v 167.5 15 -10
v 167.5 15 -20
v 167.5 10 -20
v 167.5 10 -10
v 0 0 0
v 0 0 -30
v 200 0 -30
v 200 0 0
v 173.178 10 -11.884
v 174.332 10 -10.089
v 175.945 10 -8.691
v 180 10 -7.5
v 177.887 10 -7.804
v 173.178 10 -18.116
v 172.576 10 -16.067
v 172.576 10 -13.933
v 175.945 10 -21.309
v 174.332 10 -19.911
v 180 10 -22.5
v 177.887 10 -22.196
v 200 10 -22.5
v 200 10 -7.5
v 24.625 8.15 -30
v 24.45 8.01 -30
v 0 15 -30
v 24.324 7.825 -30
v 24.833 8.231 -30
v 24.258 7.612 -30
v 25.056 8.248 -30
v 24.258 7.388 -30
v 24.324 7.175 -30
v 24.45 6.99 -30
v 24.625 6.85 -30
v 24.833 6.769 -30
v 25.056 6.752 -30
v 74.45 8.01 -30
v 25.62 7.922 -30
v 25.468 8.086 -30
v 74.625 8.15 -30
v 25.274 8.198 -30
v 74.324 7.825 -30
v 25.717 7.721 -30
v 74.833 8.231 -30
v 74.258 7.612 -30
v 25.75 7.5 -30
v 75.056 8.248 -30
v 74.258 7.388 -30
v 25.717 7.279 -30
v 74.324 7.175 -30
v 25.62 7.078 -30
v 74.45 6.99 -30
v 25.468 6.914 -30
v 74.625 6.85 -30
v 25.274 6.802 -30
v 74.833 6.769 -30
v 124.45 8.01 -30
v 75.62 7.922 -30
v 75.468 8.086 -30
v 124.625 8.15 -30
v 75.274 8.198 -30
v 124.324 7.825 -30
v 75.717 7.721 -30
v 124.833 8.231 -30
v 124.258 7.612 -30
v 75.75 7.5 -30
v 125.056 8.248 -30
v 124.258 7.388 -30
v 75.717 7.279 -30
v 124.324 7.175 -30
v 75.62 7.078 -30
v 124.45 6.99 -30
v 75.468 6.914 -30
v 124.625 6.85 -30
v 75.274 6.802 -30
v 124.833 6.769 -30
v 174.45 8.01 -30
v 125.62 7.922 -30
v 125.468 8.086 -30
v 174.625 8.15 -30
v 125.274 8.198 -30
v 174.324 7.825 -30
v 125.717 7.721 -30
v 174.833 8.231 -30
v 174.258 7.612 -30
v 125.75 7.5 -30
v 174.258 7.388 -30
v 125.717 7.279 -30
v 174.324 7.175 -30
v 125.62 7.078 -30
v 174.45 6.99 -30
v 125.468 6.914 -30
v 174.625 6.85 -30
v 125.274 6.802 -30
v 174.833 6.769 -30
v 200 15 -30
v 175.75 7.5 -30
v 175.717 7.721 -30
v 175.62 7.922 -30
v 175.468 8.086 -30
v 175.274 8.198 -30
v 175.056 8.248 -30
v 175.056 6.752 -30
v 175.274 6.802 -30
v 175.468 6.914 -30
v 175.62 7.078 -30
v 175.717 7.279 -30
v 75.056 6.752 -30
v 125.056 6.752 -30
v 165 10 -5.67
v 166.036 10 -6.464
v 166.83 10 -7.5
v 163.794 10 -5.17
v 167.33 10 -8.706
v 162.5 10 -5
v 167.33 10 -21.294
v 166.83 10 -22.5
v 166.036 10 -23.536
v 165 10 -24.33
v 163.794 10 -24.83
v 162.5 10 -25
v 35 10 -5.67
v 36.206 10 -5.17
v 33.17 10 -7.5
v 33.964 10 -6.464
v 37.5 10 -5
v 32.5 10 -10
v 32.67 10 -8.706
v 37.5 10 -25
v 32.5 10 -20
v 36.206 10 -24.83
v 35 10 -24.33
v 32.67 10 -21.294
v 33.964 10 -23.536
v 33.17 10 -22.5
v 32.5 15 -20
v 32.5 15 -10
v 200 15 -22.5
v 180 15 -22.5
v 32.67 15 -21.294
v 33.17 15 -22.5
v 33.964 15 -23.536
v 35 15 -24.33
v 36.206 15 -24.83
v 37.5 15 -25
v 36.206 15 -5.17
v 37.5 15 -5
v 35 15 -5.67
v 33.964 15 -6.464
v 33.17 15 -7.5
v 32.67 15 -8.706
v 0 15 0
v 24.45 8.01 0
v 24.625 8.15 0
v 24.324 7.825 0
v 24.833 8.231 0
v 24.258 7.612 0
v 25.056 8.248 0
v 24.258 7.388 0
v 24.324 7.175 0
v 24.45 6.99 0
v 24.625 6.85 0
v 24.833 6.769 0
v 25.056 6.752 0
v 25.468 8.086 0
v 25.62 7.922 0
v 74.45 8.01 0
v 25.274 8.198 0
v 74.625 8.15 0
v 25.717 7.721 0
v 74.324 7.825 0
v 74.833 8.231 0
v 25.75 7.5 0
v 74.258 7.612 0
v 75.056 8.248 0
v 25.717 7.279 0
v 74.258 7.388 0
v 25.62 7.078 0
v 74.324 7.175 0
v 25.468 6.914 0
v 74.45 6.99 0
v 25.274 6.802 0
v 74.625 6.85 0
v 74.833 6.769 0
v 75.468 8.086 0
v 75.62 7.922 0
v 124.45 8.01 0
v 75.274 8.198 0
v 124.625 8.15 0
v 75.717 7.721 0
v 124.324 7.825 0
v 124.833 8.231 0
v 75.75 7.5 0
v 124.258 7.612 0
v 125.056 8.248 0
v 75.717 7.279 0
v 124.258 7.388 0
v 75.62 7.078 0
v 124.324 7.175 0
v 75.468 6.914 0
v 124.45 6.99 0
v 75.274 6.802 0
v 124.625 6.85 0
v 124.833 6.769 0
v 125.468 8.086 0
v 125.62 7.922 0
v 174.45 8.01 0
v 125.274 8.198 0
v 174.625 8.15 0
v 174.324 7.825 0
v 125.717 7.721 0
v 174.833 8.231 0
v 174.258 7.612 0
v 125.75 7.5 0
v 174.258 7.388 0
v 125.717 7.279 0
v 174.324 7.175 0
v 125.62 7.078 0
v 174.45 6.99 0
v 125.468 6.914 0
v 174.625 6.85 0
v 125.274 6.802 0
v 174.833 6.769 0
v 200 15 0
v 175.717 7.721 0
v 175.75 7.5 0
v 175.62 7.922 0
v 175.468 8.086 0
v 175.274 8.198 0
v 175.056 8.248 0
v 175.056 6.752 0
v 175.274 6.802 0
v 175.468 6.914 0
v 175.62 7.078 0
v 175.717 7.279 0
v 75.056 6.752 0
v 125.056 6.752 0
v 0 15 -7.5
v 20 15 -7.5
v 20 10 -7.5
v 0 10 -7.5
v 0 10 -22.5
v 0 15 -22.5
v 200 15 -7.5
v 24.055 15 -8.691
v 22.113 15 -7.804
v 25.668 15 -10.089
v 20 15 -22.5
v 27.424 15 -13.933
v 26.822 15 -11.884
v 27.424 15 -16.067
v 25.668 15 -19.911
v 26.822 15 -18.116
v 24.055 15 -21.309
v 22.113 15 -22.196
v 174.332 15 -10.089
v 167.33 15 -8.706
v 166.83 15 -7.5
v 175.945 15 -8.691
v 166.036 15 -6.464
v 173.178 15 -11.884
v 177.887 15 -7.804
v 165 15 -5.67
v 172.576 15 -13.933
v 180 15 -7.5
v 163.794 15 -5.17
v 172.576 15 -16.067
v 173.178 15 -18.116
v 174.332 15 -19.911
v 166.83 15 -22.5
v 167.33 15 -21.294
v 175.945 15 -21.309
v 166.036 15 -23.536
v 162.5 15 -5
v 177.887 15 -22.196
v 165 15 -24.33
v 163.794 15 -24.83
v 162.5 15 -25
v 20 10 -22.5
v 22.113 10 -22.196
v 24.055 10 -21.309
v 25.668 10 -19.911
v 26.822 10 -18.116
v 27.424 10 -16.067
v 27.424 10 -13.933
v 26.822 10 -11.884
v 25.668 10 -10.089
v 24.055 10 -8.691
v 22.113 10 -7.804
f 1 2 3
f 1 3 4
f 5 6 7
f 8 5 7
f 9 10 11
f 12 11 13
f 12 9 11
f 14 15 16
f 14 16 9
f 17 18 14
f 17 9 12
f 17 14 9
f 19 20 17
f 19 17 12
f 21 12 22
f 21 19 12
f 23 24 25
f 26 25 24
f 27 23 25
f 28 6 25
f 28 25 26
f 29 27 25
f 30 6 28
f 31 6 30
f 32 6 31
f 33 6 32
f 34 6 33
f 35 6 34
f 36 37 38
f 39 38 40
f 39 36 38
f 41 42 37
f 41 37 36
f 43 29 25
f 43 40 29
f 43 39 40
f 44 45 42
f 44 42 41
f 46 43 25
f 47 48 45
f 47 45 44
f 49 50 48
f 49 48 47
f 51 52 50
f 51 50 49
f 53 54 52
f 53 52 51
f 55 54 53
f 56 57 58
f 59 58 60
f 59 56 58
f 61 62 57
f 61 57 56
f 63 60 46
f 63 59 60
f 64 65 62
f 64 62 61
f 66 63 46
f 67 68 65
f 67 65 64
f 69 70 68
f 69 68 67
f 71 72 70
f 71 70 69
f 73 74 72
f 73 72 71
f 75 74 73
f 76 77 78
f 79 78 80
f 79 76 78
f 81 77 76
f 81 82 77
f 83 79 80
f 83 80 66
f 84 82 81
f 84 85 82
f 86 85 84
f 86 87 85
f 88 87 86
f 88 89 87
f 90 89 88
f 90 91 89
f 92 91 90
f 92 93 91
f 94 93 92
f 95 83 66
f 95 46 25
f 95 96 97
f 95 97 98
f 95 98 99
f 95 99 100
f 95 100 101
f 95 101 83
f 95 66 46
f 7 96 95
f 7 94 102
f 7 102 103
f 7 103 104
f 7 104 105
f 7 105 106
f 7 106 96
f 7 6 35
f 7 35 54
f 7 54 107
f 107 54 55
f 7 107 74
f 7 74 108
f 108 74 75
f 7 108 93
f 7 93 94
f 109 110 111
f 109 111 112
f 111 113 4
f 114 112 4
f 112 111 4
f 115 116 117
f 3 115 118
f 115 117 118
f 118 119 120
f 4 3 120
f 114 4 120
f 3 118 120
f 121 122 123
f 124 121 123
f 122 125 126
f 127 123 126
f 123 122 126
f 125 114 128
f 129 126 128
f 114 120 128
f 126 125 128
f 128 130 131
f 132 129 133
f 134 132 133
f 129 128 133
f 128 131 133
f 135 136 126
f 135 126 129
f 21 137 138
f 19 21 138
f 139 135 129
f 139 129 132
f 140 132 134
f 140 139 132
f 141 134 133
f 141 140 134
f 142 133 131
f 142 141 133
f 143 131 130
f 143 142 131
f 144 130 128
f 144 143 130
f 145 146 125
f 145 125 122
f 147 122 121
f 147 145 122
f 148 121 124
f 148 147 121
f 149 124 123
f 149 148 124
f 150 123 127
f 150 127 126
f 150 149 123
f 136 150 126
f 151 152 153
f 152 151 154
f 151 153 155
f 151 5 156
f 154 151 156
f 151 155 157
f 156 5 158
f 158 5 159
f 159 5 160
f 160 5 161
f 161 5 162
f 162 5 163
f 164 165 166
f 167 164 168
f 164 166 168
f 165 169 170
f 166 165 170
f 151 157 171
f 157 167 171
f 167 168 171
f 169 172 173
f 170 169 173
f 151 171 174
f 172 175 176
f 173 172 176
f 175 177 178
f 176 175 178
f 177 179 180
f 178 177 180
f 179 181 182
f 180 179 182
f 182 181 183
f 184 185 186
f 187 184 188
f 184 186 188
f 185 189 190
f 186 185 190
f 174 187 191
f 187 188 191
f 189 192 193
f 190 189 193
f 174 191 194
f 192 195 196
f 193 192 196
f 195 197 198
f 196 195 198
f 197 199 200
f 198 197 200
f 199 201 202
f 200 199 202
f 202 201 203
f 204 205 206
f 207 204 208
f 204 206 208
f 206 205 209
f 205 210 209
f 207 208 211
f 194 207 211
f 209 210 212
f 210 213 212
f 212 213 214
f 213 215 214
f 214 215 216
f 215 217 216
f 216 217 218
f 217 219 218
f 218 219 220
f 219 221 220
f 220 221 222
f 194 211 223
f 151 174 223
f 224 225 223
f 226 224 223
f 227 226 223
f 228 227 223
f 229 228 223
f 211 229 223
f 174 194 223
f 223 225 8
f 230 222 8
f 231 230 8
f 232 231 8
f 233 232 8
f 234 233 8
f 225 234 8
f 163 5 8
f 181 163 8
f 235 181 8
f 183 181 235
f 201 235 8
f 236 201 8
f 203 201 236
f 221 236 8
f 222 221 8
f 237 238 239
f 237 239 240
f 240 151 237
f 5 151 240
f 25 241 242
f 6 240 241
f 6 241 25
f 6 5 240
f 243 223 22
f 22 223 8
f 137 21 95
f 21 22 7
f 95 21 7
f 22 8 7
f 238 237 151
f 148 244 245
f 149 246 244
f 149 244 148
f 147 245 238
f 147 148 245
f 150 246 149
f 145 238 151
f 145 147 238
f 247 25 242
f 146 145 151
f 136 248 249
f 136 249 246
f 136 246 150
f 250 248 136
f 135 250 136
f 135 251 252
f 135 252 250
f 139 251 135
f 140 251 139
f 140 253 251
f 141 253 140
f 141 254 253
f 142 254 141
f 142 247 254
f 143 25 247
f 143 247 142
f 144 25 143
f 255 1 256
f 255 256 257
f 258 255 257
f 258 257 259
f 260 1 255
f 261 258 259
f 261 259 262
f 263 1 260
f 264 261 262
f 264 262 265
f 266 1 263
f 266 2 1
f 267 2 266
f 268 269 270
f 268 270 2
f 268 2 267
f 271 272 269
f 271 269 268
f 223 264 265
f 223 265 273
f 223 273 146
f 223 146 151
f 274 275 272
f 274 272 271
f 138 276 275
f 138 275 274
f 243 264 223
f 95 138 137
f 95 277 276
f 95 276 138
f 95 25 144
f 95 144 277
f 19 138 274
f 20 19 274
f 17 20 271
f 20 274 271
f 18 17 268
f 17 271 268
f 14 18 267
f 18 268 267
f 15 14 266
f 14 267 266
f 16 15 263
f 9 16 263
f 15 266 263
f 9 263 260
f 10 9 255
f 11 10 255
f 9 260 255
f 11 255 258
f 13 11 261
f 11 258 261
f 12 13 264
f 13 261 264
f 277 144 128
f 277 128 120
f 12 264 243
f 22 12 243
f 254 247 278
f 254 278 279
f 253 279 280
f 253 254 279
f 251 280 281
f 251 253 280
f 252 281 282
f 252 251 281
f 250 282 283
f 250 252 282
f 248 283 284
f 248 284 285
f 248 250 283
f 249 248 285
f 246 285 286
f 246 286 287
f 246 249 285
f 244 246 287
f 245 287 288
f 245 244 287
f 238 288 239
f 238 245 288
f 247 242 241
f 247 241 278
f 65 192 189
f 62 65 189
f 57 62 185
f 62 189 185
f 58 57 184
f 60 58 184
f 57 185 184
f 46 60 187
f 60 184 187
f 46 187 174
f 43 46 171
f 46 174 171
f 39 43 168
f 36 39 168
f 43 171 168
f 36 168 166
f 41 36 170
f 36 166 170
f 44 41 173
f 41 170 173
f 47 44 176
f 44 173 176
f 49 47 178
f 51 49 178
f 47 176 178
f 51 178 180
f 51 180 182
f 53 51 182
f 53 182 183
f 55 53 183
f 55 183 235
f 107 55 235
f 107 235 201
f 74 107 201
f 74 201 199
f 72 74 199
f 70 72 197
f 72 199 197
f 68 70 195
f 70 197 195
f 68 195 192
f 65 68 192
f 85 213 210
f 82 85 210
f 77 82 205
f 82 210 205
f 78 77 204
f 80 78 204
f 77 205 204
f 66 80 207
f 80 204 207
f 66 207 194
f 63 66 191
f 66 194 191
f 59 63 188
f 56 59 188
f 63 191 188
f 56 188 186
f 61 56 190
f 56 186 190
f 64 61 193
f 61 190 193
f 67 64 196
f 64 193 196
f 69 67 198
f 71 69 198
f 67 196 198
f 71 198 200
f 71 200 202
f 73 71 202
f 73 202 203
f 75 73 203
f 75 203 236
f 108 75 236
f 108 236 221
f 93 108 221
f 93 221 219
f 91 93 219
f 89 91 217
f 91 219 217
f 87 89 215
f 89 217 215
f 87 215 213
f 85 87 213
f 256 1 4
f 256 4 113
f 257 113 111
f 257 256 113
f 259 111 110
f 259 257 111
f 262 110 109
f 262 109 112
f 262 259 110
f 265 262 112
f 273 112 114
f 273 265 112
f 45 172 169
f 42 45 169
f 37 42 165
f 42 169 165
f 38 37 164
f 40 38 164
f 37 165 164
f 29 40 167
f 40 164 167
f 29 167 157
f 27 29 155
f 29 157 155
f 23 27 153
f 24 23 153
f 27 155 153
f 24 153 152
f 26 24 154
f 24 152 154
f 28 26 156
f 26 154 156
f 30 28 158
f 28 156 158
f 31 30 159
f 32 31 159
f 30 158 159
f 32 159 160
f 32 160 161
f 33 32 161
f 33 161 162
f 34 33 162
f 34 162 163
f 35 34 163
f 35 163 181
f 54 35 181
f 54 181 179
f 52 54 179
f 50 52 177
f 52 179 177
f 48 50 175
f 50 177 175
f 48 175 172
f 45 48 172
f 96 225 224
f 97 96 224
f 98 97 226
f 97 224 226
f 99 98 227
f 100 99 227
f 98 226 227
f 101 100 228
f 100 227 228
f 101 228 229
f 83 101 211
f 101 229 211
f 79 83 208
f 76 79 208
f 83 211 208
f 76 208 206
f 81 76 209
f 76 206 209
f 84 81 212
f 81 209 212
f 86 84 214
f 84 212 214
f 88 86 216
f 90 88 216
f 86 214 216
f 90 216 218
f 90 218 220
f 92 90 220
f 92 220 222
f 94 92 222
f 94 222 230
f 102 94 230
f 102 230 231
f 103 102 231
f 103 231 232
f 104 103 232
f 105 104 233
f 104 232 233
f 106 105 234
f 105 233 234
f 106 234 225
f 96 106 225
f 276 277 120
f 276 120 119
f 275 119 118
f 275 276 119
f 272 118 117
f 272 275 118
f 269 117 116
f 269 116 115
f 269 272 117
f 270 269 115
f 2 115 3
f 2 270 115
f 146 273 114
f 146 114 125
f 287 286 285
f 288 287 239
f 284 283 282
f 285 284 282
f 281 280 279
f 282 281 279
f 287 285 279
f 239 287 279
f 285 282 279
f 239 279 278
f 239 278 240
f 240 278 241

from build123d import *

# Parameters (mm, degrees)
SKETCH1_W           = 200
SKETCH1_H           = 30
BOSS_EXTRUDE1_DEPTH = 15
CUT_EXTRUDE1_DEPTH  = 5
SKETCH3_R           = 0.75
CUT_EXTRUDE2_DEPTH  = 30
CUT_EXTRUDE3_DEPTH  = 5


with BuildPart() as part:
    # Sketch1 → Boss-Extrude1 (new body)
    with BuildSketch(Plane(origin=(0, 0, 0), x_dir=(1, 0, 0), z_dir=(0, 1, 0))):
        with Locations((100, 15)):
            Rectangle(SKETCH1_W, SKETCH1_H)
    extrude(amount=BOSS_EXTRUDE1_DEPTH)

    # Sketch2 → Cut-Extrude1 (cut)
    with BuildSketch(Plane(origin=(0, 15, 0), x_dir=(1, 0, 0), z_dir=(0, 1, 0))):
        with BuildLine():
            Line((-20, 22.5), (20, 22.5))
            ThreePointArc((20, 22.5), (27.5, 15), (20, 7.5))
            Line((20, 7.5), (-20, 7.5))
            ThreePointArc((-20, 7.5), (-27.5, 15), (-20, 22.5))
        make_face()
        with BuildLine():
            Line((220, 22.5), (180, 22.5))
            ThreePointArc((180, 22.5), (172.5, 15), (180, 7.5))
            Line((180, 7.5), (220, 7.5))
            ThreePointArc((220, 7.5), (227.5, 15), (220, 22.5))
        make_face()
    extrude(amount=-CUT_EXTRUDE1_DEPTH, mode=Mode.SUBTRACT)

    # Sketch3 → Cut-Extrude2 (cut)
    with BuildSketch(Plane.XY):
        with Locations((25, 7.5)):
            Circle(SKETCH3_R)
        with Locations((75, 7.5)):
            Circle(SKETCH3_R)
        with Locations((125, 7.5)):
            Circle(SKETCH3_R)
        with Locations((175, 7.5)):
            Circle(SKETCH3_R)
    extrude(amount=-CUT_EXTRUDE2_DEPTH, mode=Mode.SUBTRACT)

    # Sketch4 → Cut-Extrude3 (cut)
    with BuildSketch(Plane(origin=(0, 15, 0), x_dir=(1, 0, 0), z_dir=(0, 1, 0))):
        with BuildLine():
            Line((37.5, 25), (162.5, 25))
            ThreePointArc((162.5, 25), (166.035533906, 23.535533906), (167.5, 20))
            Line((167.5, 20), (167.5, 10))
            ThreePointArc((167.5, 10), (166.035533906, 6.464466094), (162.5, 5))
            Line((162.5, 5), (37.5, 5))
            ThreePointArc((37.5, 5), (33.964466094, 6.464466094), (32.5, 10))
            Line((32.5, 10), (32.5, 20))
            ThreePointArc((32.5, 20), (33.964466094, 23.535533906), (37.5, 25))
        make_face()
    extrude(amount=-CUT_EXTRUDE3_DEPTH, mode=Mode.SUBTRACT)


solid = part.part
